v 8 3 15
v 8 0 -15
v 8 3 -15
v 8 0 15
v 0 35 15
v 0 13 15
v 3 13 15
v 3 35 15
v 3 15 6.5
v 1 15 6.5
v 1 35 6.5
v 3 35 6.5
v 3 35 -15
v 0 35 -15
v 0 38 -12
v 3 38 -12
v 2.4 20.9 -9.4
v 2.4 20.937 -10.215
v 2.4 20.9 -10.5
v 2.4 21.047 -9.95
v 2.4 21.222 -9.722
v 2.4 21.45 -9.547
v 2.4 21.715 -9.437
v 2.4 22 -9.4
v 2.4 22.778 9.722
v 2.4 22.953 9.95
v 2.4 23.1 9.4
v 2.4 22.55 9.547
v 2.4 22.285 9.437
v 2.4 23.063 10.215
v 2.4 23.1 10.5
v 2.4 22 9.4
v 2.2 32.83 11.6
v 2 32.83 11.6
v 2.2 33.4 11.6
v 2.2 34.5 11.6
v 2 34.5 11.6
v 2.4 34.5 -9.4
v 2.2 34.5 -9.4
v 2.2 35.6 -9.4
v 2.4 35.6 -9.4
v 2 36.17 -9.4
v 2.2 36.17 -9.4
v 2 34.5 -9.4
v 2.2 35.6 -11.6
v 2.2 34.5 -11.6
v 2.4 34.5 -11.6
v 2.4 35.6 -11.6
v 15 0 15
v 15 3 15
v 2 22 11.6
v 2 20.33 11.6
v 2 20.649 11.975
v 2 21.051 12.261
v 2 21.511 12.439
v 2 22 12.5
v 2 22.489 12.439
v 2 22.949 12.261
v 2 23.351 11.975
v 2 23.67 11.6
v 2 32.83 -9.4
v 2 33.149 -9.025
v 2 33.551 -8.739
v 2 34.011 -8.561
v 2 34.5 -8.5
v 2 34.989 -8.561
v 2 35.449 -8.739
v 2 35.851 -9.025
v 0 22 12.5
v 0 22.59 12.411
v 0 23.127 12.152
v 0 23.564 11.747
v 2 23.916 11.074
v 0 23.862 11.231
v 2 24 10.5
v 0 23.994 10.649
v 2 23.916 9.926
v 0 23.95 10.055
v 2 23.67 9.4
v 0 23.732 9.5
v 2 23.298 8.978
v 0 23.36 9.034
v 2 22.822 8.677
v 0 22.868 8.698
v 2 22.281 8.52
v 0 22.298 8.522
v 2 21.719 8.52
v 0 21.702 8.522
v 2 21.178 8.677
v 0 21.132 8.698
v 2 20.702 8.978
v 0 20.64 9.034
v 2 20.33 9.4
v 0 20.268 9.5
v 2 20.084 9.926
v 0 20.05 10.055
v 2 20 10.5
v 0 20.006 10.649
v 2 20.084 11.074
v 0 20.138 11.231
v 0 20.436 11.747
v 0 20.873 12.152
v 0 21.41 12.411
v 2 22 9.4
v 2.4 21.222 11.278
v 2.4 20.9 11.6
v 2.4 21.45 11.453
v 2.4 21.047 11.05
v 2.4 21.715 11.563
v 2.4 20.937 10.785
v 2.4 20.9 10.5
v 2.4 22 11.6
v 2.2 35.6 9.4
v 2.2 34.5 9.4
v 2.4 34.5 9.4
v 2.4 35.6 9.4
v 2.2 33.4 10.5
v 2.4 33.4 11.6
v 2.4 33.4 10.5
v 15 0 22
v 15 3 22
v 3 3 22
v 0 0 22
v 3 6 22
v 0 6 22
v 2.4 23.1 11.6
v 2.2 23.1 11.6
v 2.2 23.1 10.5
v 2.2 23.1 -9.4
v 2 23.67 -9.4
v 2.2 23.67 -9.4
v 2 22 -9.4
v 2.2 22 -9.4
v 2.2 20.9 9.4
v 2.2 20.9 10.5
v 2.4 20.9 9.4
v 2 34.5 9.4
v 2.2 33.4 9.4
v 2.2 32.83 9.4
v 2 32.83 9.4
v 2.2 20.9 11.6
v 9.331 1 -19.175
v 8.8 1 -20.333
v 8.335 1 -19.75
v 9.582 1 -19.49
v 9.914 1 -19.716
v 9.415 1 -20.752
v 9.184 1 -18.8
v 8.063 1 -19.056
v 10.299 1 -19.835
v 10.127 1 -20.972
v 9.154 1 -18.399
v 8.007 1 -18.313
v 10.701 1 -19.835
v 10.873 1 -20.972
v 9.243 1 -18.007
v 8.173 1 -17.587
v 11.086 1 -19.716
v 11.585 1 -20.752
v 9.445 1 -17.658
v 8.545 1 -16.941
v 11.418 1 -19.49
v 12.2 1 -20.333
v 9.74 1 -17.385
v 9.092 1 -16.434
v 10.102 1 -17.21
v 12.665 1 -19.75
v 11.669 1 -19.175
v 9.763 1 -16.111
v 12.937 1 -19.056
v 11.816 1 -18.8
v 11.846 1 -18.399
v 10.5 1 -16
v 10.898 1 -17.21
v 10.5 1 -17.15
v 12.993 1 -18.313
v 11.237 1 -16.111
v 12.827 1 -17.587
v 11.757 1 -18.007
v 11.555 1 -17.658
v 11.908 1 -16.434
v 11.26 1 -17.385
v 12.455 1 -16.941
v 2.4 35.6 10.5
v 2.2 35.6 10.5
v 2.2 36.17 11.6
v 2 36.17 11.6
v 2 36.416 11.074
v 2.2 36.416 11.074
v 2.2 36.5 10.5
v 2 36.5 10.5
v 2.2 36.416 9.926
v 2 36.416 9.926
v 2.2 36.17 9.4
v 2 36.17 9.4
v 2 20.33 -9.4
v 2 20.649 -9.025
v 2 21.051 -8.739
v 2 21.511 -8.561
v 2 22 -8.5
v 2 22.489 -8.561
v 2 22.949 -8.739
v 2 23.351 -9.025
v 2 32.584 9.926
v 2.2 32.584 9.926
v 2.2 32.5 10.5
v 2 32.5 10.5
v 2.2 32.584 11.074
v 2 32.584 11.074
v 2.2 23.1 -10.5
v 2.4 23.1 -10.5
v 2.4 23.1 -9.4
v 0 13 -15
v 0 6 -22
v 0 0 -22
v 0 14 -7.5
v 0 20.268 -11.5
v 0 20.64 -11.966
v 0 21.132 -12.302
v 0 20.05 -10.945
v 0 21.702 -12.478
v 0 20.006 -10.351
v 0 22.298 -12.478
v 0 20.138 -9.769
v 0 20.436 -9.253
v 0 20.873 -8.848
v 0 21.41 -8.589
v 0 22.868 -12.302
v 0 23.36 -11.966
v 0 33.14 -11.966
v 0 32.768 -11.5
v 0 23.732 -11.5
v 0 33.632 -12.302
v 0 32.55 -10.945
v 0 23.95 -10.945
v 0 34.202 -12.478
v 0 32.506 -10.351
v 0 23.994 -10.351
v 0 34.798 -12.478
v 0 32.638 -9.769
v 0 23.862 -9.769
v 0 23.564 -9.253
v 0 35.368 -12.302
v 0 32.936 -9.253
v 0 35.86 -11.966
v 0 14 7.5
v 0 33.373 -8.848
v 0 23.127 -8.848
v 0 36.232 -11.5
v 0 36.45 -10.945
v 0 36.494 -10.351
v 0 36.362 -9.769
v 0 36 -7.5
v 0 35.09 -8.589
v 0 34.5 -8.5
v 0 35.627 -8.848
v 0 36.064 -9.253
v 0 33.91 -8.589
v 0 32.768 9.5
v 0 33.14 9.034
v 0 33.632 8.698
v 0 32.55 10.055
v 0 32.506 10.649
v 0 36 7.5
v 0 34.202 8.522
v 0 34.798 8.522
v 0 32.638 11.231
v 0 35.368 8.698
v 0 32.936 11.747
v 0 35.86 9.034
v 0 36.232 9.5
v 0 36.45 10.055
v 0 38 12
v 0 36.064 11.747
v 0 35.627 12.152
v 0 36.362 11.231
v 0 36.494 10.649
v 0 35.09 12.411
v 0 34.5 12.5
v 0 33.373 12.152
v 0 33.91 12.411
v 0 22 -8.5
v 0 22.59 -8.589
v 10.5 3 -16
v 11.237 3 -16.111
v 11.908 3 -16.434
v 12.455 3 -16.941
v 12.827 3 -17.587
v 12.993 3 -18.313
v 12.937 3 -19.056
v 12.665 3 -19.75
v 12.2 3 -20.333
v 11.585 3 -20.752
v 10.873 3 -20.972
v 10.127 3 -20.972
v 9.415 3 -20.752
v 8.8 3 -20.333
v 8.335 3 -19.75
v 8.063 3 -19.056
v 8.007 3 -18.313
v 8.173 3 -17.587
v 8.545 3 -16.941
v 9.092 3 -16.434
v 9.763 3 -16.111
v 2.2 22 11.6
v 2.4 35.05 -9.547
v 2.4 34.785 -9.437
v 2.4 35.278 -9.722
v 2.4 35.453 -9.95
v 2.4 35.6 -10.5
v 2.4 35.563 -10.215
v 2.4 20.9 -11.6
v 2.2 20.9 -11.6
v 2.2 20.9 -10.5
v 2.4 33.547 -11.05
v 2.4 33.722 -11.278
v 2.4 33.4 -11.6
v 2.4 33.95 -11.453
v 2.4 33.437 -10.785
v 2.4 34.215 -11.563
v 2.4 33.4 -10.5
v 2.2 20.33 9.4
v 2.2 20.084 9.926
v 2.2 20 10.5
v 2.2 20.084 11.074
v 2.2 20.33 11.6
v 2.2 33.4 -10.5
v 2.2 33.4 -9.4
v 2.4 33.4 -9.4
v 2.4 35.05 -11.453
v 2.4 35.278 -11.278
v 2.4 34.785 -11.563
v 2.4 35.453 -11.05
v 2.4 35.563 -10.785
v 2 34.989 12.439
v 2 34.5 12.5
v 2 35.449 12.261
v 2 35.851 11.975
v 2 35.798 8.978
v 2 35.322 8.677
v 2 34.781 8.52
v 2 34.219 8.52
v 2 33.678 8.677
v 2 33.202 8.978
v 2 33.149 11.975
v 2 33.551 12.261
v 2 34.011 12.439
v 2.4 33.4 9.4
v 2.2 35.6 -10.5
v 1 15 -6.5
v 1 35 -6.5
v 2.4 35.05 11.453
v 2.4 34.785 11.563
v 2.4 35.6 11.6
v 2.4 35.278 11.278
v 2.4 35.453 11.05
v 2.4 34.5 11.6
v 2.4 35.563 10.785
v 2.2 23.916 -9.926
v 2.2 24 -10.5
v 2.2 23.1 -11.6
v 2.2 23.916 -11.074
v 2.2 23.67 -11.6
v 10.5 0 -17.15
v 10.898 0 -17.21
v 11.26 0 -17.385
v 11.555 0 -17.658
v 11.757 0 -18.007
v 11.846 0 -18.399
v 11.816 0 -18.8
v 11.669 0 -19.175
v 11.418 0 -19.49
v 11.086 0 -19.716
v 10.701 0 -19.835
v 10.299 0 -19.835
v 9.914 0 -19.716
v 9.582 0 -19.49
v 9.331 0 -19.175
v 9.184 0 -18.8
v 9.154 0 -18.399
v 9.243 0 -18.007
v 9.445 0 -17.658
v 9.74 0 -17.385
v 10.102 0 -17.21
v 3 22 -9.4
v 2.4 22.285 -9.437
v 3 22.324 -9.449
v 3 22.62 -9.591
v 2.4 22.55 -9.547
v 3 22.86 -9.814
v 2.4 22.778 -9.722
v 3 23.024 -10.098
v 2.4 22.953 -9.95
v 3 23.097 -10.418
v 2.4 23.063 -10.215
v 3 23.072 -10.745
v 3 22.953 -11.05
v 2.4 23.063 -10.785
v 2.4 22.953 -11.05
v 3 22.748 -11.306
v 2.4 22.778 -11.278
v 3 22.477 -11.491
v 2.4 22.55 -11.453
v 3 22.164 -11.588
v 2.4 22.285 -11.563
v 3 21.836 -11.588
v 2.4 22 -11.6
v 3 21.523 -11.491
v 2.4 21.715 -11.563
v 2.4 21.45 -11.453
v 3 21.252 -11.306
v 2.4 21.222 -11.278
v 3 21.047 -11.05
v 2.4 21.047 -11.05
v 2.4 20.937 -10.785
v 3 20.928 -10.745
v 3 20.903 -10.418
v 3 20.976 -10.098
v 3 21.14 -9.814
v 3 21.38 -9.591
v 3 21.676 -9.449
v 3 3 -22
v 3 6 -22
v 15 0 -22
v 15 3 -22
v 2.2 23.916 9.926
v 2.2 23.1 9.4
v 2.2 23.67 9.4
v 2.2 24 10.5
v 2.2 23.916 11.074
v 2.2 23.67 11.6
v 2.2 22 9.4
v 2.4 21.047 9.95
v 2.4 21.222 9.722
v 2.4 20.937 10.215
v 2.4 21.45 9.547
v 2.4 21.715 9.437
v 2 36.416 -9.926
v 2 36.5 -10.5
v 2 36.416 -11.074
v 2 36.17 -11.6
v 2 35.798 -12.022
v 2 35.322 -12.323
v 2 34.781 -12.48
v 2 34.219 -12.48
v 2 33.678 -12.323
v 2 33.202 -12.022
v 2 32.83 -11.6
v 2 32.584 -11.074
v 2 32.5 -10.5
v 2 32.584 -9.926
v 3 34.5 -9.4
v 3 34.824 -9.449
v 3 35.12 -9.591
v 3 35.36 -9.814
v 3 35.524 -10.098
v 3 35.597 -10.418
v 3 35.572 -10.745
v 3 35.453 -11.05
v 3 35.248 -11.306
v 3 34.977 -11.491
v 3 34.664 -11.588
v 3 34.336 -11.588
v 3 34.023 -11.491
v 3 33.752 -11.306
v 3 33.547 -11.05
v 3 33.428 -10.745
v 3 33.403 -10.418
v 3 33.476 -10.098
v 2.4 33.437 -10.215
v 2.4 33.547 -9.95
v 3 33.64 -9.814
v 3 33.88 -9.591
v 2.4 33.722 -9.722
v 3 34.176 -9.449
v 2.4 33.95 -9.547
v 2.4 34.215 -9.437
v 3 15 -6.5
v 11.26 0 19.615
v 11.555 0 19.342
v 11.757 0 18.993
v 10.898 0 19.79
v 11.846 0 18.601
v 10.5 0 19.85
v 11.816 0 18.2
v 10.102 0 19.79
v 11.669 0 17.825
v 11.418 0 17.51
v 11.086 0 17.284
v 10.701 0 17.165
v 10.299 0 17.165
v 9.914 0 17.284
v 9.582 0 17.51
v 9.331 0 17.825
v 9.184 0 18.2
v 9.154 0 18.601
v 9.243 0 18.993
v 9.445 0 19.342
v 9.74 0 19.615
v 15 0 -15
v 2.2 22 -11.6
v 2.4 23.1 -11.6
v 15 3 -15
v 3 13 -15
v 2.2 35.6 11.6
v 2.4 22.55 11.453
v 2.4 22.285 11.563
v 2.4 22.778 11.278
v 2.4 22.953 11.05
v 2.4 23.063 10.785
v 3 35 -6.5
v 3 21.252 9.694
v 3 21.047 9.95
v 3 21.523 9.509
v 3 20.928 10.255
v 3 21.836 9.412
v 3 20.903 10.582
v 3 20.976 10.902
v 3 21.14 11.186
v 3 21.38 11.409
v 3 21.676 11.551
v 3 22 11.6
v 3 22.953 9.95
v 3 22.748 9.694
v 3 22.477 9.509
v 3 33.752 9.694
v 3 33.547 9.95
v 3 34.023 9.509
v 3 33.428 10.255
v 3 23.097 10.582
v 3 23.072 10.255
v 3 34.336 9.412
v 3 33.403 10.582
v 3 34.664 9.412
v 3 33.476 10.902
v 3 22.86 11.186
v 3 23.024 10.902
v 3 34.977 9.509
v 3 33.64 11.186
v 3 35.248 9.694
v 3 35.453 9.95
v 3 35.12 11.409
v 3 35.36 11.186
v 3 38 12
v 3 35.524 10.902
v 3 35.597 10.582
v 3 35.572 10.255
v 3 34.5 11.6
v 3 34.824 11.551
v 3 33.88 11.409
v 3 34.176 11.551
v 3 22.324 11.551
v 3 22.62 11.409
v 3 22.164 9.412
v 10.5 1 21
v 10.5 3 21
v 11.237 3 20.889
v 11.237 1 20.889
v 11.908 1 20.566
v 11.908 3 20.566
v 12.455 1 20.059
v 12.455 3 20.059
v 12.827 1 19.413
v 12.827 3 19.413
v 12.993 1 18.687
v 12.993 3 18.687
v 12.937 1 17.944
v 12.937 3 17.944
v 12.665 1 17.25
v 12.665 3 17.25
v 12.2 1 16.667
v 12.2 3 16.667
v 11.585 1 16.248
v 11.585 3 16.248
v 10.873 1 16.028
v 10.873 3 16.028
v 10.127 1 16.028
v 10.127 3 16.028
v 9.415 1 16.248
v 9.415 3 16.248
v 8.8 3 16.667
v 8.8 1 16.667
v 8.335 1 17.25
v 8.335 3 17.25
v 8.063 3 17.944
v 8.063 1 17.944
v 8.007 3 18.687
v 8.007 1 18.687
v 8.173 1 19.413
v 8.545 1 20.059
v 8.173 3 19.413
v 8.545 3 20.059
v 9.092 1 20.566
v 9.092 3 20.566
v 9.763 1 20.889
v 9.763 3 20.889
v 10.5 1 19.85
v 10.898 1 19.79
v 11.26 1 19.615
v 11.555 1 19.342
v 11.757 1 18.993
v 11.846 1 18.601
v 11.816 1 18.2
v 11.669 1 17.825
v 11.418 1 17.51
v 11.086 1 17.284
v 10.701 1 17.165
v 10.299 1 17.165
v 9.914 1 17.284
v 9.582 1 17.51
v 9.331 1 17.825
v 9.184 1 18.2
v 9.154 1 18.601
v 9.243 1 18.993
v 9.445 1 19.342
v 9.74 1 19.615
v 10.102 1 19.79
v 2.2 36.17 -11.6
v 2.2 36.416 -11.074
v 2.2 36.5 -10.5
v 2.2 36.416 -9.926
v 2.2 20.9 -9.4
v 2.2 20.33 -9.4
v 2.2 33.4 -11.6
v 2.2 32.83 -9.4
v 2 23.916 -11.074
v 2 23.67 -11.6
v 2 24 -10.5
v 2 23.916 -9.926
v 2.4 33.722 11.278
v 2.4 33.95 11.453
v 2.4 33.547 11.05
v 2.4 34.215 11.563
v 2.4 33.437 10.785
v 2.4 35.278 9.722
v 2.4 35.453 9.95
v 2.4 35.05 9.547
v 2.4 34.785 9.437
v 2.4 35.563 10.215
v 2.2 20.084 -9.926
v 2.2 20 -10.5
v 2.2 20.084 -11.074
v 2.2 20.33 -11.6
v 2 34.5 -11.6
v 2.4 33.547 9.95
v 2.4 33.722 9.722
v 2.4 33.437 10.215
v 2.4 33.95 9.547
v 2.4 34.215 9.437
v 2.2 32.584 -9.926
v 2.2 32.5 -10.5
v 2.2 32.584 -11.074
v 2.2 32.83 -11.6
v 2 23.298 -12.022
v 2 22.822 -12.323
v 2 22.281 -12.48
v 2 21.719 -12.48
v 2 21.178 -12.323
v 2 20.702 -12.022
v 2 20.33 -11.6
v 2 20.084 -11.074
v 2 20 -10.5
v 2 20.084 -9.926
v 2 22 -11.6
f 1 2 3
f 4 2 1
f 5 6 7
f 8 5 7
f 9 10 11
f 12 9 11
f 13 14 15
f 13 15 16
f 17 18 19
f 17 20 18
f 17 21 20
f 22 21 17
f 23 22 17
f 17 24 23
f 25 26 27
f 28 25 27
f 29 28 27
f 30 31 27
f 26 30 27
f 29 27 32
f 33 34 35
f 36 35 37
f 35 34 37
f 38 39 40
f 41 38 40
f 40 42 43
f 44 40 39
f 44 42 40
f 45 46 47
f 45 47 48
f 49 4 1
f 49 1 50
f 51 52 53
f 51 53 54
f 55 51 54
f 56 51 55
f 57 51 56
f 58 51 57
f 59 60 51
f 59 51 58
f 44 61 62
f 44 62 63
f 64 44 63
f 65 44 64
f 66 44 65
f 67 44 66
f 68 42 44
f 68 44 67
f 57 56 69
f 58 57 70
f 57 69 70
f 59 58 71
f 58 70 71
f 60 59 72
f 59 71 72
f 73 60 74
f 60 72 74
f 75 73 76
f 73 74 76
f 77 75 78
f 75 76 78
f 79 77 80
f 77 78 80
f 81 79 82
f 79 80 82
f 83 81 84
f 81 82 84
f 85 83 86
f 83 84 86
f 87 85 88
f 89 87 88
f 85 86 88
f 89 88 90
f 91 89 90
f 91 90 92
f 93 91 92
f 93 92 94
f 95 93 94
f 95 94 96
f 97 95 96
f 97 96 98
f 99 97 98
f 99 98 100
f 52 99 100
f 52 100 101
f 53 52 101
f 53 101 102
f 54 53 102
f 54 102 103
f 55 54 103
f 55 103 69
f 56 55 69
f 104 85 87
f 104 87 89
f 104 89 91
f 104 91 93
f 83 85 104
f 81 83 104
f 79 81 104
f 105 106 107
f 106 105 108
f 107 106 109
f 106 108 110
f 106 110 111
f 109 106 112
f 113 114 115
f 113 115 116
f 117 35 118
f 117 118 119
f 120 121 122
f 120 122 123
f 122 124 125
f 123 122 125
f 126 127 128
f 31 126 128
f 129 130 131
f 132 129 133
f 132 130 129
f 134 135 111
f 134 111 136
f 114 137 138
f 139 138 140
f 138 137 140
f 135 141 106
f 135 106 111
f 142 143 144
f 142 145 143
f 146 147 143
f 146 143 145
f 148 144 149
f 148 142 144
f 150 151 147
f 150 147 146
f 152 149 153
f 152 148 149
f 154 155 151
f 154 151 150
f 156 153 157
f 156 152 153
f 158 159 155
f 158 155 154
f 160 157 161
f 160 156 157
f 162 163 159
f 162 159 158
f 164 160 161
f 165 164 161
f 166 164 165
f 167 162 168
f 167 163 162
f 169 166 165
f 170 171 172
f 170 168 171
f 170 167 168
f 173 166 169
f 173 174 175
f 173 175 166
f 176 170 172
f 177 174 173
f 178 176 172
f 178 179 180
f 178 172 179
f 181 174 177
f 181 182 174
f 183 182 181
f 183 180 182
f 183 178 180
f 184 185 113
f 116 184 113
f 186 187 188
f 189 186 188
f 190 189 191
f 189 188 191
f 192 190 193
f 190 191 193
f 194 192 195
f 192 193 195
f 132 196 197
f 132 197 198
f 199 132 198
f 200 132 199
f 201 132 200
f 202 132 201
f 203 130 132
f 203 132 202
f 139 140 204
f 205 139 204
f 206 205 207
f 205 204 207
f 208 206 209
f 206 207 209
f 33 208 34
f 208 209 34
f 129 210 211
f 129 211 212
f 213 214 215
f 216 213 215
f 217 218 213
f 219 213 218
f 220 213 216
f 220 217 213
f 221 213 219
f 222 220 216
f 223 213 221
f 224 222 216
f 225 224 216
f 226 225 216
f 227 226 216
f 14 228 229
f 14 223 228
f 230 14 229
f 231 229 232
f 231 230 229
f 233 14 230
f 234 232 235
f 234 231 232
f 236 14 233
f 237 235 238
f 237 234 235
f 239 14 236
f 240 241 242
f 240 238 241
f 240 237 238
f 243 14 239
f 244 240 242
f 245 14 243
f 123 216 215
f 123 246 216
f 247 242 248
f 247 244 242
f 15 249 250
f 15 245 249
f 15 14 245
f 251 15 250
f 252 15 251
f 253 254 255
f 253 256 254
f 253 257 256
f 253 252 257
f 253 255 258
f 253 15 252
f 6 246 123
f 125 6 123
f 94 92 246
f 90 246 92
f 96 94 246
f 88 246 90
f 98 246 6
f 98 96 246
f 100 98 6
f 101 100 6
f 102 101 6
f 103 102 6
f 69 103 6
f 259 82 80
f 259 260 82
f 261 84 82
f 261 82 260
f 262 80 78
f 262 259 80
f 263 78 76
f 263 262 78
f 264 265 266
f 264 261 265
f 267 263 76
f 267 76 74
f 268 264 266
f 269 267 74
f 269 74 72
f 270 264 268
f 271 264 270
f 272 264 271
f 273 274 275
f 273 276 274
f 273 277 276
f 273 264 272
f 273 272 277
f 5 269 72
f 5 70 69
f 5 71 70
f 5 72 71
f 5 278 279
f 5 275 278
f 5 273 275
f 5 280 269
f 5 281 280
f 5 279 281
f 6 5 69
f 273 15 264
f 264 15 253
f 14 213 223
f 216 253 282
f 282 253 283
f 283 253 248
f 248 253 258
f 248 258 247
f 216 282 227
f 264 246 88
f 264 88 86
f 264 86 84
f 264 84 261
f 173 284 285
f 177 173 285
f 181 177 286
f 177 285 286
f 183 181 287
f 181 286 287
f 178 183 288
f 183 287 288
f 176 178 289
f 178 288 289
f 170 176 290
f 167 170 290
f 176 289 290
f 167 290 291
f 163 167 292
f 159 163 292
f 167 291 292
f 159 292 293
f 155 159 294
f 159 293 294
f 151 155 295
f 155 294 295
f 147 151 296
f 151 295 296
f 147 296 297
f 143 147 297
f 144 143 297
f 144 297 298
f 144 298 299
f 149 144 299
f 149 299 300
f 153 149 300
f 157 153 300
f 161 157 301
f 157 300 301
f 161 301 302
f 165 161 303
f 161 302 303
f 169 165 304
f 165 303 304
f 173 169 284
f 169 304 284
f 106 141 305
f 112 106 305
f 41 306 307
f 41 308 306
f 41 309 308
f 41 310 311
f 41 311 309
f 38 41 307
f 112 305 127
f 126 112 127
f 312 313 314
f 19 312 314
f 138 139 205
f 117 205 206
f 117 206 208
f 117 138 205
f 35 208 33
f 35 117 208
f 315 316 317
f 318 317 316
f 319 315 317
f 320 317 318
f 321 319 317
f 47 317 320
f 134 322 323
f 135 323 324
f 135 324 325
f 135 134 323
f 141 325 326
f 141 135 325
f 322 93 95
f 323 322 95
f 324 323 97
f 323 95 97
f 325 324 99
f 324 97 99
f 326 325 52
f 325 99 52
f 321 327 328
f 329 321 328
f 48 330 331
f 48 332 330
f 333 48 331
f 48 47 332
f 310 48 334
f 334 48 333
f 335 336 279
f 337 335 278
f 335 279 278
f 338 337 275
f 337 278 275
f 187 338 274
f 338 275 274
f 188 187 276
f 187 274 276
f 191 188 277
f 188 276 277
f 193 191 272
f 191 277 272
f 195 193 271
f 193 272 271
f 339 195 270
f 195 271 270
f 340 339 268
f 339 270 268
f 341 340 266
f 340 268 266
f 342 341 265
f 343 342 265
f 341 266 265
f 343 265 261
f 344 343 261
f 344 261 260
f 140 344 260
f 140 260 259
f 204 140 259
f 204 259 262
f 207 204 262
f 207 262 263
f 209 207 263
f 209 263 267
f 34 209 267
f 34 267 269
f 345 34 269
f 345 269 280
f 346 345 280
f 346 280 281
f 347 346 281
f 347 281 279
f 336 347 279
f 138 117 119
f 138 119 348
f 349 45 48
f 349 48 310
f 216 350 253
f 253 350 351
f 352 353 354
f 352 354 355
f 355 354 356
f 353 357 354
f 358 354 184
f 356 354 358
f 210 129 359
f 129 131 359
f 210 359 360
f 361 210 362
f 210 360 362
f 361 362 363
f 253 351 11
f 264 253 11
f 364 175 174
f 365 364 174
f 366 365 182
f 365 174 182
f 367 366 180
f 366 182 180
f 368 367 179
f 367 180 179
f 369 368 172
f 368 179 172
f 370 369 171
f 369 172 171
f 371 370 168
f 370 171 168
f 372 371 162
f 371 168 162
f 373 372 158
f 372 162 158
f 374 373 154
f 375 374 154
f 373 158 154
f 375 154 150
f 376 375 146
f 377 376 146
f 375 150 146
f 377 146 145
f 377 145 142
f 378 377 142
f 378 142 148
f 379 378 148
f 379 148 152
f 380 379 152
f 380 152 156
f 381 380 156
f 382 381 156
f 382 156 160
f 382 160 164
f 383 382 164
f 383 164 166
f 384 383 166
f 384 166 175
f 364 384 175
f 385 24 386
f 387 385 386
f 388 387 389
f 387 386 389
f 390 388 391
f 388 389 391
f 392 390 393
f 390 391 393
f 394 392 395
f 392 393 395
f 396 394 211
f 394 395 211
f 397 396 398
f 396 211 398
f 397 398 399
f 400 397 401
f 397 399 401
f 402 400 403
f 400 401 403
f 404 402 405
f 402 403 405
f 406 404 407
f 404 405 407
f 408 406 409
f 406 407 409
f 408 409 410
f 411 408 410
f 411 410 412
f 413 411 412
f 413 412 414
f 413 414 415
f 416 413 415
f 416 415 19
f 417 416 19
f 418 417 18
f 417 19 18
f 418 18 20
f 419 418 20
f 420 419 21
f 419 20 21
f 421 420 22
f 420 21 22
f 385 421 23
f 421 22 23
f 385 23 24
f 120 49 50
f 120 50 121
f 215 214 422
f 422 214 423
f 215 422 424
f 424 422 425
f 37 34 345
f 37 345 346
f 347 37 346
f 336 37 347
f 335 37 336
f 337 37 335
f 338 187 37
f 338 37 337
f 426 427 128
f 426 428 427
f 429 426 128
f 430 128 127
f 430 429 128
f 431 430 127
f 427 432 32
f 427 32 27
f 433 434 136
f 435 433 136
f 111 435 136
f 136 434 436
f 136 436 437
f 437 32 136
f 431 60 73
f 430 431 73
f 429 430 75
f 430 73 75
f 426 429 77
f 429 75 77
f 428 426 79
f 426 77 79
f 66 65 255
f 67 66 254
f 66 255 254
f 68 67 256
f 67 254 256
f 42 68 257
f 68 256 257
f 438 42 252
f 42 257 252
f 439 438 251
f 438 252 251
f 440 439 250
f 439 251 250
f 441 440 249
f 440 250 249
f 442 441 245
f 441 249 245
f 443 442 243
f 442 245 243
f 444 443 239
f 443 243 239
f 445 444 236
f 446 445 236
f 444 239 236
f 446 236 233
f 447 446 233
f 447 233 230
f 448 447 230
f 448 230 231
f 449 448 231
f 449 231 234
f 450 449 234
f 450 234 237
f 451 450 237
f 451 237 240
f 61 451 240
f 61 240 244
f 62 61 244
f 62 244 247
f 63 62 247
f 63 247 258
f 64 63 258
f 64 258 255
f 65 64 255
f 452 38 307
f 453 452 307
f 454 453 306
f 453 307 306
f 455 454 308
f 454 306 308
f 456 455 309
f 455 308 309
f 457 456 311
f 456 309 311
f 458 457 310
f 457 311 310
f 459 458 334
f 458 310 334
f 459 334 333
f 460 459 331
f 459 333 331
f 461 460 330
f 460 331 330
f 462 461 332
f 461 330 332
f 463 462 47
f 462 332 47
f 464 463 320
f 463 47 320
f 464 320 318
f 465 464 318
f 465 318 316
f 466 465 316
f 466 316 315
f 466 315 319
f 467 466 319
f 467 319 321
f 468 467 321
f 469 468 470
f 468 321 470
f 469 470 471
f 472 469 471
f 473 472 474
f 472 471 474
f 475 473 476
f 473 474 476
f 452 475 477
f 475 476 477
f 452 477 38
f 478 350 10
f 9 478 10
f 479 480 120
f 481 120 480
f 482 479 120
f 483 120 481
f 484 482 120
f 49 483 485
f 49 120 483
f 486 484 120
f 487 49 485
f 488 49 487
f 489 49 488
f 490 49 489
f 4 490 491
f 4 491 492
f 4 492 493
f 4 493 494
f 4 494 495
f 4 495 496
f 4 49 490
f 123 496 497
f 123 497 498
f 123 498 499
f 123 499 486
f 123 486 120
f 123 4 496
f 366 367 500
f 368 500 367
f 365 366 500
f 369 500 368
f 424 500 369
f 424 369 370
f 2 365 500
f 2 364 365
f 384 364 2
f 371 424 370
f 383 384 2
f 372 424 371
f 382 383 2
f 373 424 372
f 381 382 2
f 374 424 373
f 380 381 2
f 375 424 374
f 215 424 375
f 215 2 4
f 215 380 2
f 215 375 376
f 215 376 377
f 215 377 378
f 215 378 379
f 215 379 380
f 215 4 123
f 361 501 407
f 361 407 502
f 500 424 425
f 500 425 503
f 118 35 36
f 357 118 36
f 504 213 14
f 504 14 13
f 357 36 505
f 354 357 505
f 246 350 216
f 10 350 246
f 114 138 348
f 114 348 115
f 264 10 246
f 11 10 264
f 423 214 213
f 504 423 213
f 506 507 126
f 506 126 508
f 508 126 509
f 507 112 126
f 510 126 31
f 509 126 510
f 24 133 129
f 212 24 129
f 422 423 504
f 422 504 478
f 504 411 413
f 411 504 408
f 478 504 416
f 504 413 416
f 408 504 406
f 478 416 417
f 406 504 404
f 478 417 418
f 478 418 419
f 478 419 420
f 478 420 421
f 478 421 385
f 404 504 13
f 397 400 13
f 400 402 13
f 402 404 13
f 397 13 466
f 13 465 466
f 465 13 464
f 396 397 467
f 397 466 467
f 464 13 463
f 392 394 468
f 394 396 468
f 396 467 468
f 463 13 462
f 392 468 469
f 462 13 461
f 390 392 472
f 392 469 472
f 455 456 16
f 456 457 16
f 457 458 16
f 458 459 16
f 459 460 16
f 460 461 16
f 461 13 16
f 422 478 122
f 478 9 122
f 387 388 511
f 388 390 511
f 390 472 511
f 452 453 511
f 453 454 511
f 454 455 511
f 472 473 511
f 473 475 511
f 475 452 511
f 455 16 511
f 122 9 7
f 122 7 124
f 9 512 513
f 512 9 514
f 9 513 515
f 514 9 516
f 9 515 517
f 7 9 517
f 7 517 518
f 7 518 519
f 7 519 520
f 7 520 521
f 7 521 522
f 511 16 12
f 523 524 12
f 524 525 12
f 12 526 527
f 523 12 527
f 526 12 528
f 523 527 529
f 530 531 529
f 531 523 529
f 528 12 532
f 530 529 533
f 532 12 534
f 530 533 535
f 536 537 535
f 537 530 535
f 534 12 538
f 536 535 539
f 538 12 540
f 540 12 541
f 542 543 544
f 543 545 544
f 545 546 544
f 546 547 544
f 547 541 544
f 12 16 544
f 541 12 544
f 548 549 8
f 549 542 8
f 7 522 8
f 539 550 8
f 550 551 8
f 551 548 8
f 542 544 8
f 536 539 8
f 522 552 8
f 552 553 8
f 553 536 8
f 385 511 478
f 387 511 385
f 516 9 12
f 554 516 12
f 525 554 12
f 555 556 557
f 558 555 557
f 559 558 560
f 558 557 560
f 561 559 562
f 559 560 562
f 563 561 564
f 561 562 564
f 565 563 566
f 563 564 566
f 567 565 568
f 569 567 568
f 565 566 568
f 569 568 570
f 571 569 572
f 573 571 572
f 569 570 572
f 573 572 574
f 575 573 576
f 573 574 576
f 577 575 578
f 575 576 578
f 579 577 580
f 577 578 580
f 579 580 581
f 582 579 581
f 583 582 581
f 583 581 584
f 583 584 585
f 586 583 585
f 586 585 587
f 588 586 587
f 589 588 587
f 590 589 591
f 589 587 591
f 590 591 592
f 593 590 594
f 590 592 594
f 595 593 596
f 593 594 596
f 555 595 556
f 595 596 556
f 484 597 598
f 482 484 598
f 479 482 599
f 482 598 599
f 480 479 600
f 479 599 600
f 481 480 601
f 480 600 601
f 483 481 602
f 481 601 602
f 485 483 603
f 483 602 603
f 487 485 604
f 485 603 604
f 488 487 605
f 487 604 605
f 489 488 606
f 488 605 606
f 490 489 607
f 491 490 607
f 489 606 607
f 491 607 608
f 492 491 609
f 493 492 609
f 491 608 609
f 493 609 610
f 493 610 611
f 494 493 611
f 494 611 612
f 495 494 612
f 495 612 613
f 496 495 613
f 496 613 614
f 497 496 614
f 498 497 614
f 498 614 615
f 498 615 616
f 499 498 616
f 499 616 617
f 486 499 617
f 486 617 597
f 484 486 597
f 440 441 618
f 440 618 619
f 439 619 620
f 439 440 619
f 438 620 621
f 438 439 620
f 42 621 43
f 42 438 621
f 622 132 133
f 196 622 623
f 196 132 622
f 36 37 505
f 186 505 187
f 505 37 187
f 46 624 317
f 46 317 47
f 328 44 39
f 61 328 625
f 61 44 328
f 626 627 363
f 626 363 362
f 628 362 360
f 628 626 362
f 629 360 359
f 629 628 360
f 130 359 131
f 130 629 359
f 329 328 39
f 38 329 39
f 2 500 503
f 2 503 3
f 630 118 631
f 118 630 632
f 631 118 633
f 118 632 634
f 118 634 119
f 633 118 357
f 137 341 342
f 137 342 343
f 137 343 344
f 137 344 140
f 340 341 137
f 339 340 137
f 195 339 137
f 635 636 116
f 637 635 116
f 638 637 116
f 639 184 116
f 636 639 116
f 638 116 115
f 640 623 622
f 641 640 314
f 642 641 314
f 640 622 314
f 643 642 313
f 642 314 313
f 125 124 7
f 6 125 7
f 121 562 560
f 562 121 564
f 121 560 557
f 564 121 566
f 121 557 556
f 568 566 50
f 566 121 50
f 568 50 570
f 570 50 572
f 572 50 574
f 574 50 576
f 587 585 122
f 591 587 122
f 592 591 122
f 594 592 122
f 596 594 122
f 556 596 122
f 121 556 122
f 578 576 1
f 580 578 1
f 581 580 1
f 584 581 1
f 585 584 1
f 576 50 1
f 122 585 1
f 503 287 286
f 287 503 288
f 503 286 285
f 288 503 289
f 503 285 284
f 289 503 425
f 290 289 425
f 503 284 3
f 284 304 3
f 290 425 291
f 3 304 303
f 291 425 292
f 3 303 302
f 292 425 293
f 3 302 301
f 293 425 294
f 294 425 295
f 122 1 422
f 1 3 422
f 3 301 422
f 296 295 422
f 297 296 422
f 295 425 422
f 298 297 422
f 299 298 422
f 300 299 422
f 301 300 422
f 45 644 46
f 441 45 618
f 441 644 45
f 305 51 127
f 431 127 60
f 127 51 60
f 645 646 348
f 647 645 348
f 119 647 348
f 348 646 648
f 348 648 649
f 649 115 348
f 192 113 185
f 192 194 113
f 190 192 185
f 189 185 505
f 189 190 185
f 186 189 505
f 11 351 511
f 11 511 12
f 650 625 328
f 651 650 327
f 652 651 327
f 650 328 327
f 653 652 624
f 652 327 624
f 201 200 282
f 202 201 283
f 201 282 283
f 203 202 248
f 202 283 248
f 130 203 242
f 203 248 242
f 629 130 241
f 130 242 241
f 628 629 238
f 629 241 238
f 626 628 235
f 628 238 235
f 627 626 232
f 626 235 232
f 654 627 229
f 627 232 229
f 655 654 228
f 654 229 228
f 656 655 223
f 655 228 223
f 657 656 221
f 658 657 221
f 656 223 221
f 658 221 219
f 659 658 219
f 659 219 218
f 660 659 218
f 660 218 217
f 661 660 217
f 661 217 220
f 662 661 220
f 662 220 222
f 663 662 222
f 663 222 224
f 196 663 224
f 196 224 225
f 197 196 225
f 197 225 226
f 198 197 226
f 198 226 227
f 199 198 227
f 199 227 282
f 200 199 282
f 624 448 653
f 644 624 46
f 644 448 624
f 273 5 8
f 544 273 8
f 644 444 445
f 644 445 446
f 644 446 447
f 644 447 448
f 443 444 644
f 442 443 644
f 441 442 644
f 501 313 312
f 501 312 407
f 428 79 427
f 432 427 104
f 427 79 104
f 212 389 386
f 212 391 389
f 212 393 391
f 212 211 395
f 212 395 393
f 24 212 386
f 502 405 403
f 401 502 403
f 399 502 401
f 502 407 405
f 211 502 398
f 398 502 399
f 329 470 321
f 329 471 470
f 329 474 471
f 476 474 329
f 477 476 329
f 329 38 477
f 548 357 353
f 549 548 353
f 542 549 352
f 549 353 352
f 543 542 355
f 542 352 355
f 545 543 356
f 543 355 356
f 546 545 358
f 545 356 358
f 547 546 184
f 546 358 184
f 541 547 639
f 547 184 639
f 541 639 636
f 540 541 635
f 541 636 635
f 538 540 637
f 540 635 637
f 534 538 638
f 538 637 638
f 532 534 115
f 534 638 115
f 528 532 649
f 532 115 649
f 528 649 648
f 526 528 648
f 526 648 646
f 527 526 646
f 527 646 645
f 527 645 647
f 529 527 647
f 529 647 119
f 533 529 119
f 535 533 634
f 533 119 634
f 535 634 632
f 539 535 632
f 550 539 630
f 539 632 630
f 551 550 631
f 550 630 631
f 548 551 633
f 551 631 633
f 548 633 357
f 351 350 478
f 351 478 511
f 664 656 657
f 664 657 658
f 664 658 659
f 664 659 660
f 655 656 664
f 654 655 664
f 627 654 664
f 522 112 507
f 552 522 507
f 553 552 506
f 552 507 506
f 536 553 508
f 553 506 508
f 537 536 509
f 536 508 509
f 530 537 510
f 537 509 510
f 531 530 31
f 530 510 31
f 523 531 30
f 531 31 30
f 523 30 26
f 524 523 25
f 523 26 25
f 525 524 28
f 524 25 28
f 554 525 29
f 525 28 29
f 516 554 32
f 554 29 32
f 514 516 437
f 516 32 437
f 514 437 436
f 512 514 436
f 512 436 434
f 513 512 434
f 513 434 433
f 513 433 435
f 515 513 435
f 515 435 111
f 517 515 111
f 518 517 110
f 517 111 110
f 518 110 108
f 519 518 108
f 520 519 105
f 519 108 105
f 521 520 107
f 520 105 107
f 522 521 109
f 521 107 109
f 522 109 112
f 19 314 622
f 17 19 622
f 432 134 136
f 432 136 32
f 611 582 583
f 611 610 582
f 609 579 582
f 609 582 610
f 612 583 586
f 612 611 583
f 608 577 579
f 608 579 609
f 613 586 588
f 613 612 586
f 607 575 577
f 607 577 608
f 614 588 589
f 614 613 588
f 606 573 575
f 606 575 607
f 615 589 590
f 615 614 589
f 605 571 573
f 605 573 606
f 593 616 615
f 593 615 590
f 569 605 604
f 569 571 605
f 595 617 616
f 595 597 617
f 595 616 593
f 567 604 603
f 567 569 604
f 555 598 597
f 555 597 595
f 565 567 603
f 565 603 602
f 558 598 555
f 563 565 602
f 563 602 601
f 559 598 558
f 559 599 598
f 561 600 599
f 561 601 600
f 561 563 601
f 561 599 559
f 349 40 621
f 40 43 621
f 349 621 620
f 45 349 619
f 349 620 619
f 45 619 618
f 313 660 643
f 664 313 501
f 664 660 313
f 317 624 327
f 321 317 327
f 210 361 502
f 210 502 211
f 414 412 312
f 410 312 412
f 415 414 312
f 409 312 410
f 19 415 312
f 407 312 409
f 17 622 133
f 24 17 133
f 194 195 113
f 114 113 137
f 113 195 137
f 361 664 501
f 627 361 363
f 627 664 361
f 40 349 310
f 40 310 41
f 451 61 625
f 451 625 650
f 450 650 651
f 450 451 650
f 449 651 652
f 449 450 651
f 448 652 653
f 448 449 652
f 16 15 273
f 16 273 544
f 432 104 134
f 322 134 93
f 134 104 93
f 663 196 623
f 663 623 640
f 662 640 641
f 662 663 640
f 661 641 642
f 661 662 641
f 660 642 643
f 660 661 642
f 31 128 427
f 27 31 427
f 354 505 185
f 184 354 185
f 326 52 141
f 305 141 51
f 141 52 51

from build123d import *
from build123d.topology import SkipClean

# Parameters (mm, degrees)
BOSS_EXTRUDE1_DEPTH = 3
SKETCH2_R           = 1.35
CUT_EXTRUDE1_DEPTH  = 27.795522014
SKETCH3_R           = 2.5
CUT_EXTRUDE2_DEPTH  = 2
SKETCH4_W           = 3
SKETCH4_H           = 30
BOSS_EXTRUDE2_DEPTH = 35
SKETCH5_R           = 1.1
CUT_EXTRUDE3_DEPTH  = 47.400431032
SKETCH6_W           = 13
SKETCH6_H           = 20
CUT_EXTRUDE4_DEPTH  = 47.400431032
CHAMFER1_SIZE       = 10
CHAMFER2_SIZE       = 1
CHAMFER3_SIZE       = 3
SKETCH7_R           = 2
CUT_EXTRUDE5_DEPTH  = 2
CUT_EXTRUDE6_DEPTH  = 0.2
SKETCH9_W           = 2.2
SKETCH9_H           = 2.2
CUT_EXTRUDE7_DEPTH  = 0.2


with BuildPart() as part:
    # Sketch1 → Boss-Extrude1 (new body)
    with BuildSketch(Plane(origin=(0, 0, 0), x_dir=(1, 0, 0), z_dir=(0, 1, 0))):
        Polygon((0, -22), (0, 22), (15, 22), (15, 15), (8, 15), (8, -15), (15, -15), (15, -22), align=None)
    extrude(amount=BOSS_EXTRUDE1_DEPTH)

    # Sketch2 → Cut-Extrude1 (cut, through all)
    with BuildSketch(Plane(origin=(0, 3, 0), x_dir=(1, 0, 0), z_dir=(0, 1, 0))):
        with Locations(Location((10.5, 18.5, 0), (0, 0, 270))):
            Circle(SKETCH2_R)
        with Locations(Location((10.5, -18.5, 0), (0, 0, 270))):
            Circle(SKETCH2_R)
    extrude(amount=-CUT_EXTRUDE1_DEPTH, mode=Mode.SUBTRACT)

    # Sketch3 → Cut-Extrude2 (cut)
    with BuildSketch(Plane(origin=(0, 3, 0), x_dir=(1, 0, 0), z_dir=(0, 1, 0))):
        with Locations(Location((10.5, 18.5, 0), (0, 0, 270))):
            Circle(SKETCH3_R)
        with Locations(Location((10.5, -18.5, 0), (0, 0, 270))):
            Circle(SKETCH3_R)
    extrude(amount=-CUT_EXTRUDE2_DEPTH, mode=Mode.SUBTRACT)

    # Sketch4 → Boss-Extrude2 (add)
    with BuildSketch(Plane(origin=(0, 3, 0), x_dir=(1, 0, 0), z_dir=(0, 1, 0))):
        with Locations((1.5, 0)):
            Rectangle(SKETCH4_W, SKETCH4_H)
    extrude(amount=BOSS_EXTRUDE2_DEPTH)

    # Sketch5 → Cut-Extrude3 (cut, through all)
    with BuildSketch(Plane.ZY):
        with Locations((-10.5, 34.5)):
            Circle(SKETCH5_R)
        with Locations((10.5, 34.5)):
            Circle(SKETCH5_R)
        with Locations((10.5, 22)):
            Circle(SKETCH5_R)
        with Locations((-10.5, 22)):
            Circle(SKETCH5_R)
    extrude(amount=-CUT_EXTRUDE3_DEPTH, mode=Mode.SUBTRACT)

    # Sketch6 → Cut-Extrude4 (cut, through all)
    with BuildSketch(Plane.ZY):
        with Locations((0, 25)):
            Rectangle(SKETCH6_W, SKETCH6_H)
    extrude(amount=-CUT_EXTRUDE4_DEPTH, mode=Mode.SUBTRACT)

    # Chamfer1
    # the kernel refuses this chamfer: 10 mm, written as the material it adds along each edge
    with BuildSketch(Plane(origin=(0, 3, -15), x_dir=(0, -0.02749587661058636, -0.9996219169112968), z_dir=(1, 0, 0))) as chamfer1_piece_1_section:
        Polygon((CHAMFER1_SIZE * 0.999621916911, CHAMFER1_SIZE * 0.0274958766106), (-CHAMFER1_SIZE * 0.0274958766106, CHAMFER1_SIZE * 0.999621916911), (0, 0), align=None)
    chamfer1_piece_1 = extrude(amount=3, mode=Mode.PRIVATE)
    chamfer1_piece_1 = split(chamfer1_piece_1, bisect_by=Plane(origin=(1.5, 6.564102564, -22), z_dir=(0, 0, 1)), keep=Keep.TOP, mode=Mode.PRIVATE)
    add(chamfer1_piece_1)
    with BuildSketch(Plane(origin=(3, 3, 15), x_dir=(0, -0.02749587661058636, 0.9996219169112968), z_dir=(-1, 0, 0))) as chamfer1_piece_2_section:
        Polygon((CHAMFER1_SIZE * 0.999621916911, CHAMFER1_SIZE * 0.0274958766106), (-CHAMFER1_SIZE * 0.0274958766106, CHAMFER1_SIZE * 0.999621916911), (0, 0), align=None)
    chamfer1_piece_2 = extrude(amount=3, mode=Mode.PRIVATE)
    chamfer1_piece_2 = split(chamfer1_piece_2, bisect_by=Plane(origin=(1.5, 6.564102564, 22), z_dir=(0, 0, -1)), keep=Keep.TOP, mode=Mode.PRIVATE)
    add(chamfer1_piece_2)

    # Chamfer2
    chamfer2_edges = [part.edges().sort_by_distance(p)[0] for p in [
        (0, 25, -6.5),
        (0, 15, 0),
        (0, 25, 6.5),
        (0, 35, 0),
    ]]
    chamfer(chamfer2_edges, length=CHAMFER2_SIZE)

    # Chamfer3
    chamfer3_edges = [part.edges().sort_by_distance(p)[0] for p in [
        (1.5, 38, 15),
        (1.5, 38, -15),
    ]]
    chamfer(chamfer3_edges, length=CHAMFER3_SIZE)

    # Sketch7 → Cut-Extrude5 (cut)
    with BuildSketch(Plane.ZY):
        with Locations((-10.5, 34.5)):
            Circle(SKETCH7_R)
        with Locations((10.5, 34.5)):
            Circle(SKETCH7_R)
        with Locations((10.5, 22)):
            Circle(SKETCH7_R)
        with Locations((-10.5, 22)):
            Circle(SKETCH7_R)
    extrude(amount=-CUT_EXTRUDE5_DEPTH, mode=Mode.SUBTRACT)

    # Sketch8 → Cut-Extrude6 (cut)
    with SkipClean():  # the faces are left unmerged after this step: merging them gives an invalid solid
        with BuildSketch(Plane.ZY.offset(-2)):
            with BuildLine():
                Line((-11.6, 32.829670691), (-11.6, 36.170329309))
                ThreePointArc((-11.6, 36.170329309), (-10.5, 36.5), (-9.4, 36.170329309))
                Line((-9.4, 36.170329309), (-9.4, 32.829670691))
                ThreePointArc((-9.4, 32.829670691), (-10.5, 32.5), (-11.6, 32.829670691))
            make_face()
            with BuildLine():
                Line((-11.6, 20.329670691), (-11.6, 23.670329309))
                ThreePointArc((-11.6, 23.670329309), (-10.5, 24), (-9.4, 23.670329309))
                Line((-9.4, 23.670329309), (-9.4, 20.329670691))
                ThreePointArc((-9.4, 20.329670691), (-10.5, 20), (-11.6, 20.329670691))
            make_face()
        cut_extrude6 = extrude(amount=-CUT_EXTRUDE6_DEPTH, mode=Mode.SUBTRACT)

    # Sketch9 → Cut-Extrude7 (cut)
    with SkipClean():  # the faces are left unmerged after this step: merging them gives an invalid solid
        with BuildSketch(Plane.ZY.offset(-2.2)):
            with Locations((-10.5, 22)):
                Rectangle(SKETCH9_W, SKETCH9_H)
            with Locations((-10.5, 34.5)):
                Rectangle(SKETCH9_W, SKETCH9_H)
        cut_extrude7 = extrude(amount=-CUT_EXTRUDE7_DEPTH, mode=Mode.SUBTRACT)

    # Mirror1: Cut-Extrude6, Cut-Extrude7 across plane
    with SkipClean():  # the faces are left unmerged after this step: merging them gives an invalid solid
        add(cut_extrude6.mirror(Plane.XY), mode=Mode.SUBTRACT)
        add(cut_extrude7.mirror(Plane.XY), mode=Mode.SUBTRACT)


solid = part.part
